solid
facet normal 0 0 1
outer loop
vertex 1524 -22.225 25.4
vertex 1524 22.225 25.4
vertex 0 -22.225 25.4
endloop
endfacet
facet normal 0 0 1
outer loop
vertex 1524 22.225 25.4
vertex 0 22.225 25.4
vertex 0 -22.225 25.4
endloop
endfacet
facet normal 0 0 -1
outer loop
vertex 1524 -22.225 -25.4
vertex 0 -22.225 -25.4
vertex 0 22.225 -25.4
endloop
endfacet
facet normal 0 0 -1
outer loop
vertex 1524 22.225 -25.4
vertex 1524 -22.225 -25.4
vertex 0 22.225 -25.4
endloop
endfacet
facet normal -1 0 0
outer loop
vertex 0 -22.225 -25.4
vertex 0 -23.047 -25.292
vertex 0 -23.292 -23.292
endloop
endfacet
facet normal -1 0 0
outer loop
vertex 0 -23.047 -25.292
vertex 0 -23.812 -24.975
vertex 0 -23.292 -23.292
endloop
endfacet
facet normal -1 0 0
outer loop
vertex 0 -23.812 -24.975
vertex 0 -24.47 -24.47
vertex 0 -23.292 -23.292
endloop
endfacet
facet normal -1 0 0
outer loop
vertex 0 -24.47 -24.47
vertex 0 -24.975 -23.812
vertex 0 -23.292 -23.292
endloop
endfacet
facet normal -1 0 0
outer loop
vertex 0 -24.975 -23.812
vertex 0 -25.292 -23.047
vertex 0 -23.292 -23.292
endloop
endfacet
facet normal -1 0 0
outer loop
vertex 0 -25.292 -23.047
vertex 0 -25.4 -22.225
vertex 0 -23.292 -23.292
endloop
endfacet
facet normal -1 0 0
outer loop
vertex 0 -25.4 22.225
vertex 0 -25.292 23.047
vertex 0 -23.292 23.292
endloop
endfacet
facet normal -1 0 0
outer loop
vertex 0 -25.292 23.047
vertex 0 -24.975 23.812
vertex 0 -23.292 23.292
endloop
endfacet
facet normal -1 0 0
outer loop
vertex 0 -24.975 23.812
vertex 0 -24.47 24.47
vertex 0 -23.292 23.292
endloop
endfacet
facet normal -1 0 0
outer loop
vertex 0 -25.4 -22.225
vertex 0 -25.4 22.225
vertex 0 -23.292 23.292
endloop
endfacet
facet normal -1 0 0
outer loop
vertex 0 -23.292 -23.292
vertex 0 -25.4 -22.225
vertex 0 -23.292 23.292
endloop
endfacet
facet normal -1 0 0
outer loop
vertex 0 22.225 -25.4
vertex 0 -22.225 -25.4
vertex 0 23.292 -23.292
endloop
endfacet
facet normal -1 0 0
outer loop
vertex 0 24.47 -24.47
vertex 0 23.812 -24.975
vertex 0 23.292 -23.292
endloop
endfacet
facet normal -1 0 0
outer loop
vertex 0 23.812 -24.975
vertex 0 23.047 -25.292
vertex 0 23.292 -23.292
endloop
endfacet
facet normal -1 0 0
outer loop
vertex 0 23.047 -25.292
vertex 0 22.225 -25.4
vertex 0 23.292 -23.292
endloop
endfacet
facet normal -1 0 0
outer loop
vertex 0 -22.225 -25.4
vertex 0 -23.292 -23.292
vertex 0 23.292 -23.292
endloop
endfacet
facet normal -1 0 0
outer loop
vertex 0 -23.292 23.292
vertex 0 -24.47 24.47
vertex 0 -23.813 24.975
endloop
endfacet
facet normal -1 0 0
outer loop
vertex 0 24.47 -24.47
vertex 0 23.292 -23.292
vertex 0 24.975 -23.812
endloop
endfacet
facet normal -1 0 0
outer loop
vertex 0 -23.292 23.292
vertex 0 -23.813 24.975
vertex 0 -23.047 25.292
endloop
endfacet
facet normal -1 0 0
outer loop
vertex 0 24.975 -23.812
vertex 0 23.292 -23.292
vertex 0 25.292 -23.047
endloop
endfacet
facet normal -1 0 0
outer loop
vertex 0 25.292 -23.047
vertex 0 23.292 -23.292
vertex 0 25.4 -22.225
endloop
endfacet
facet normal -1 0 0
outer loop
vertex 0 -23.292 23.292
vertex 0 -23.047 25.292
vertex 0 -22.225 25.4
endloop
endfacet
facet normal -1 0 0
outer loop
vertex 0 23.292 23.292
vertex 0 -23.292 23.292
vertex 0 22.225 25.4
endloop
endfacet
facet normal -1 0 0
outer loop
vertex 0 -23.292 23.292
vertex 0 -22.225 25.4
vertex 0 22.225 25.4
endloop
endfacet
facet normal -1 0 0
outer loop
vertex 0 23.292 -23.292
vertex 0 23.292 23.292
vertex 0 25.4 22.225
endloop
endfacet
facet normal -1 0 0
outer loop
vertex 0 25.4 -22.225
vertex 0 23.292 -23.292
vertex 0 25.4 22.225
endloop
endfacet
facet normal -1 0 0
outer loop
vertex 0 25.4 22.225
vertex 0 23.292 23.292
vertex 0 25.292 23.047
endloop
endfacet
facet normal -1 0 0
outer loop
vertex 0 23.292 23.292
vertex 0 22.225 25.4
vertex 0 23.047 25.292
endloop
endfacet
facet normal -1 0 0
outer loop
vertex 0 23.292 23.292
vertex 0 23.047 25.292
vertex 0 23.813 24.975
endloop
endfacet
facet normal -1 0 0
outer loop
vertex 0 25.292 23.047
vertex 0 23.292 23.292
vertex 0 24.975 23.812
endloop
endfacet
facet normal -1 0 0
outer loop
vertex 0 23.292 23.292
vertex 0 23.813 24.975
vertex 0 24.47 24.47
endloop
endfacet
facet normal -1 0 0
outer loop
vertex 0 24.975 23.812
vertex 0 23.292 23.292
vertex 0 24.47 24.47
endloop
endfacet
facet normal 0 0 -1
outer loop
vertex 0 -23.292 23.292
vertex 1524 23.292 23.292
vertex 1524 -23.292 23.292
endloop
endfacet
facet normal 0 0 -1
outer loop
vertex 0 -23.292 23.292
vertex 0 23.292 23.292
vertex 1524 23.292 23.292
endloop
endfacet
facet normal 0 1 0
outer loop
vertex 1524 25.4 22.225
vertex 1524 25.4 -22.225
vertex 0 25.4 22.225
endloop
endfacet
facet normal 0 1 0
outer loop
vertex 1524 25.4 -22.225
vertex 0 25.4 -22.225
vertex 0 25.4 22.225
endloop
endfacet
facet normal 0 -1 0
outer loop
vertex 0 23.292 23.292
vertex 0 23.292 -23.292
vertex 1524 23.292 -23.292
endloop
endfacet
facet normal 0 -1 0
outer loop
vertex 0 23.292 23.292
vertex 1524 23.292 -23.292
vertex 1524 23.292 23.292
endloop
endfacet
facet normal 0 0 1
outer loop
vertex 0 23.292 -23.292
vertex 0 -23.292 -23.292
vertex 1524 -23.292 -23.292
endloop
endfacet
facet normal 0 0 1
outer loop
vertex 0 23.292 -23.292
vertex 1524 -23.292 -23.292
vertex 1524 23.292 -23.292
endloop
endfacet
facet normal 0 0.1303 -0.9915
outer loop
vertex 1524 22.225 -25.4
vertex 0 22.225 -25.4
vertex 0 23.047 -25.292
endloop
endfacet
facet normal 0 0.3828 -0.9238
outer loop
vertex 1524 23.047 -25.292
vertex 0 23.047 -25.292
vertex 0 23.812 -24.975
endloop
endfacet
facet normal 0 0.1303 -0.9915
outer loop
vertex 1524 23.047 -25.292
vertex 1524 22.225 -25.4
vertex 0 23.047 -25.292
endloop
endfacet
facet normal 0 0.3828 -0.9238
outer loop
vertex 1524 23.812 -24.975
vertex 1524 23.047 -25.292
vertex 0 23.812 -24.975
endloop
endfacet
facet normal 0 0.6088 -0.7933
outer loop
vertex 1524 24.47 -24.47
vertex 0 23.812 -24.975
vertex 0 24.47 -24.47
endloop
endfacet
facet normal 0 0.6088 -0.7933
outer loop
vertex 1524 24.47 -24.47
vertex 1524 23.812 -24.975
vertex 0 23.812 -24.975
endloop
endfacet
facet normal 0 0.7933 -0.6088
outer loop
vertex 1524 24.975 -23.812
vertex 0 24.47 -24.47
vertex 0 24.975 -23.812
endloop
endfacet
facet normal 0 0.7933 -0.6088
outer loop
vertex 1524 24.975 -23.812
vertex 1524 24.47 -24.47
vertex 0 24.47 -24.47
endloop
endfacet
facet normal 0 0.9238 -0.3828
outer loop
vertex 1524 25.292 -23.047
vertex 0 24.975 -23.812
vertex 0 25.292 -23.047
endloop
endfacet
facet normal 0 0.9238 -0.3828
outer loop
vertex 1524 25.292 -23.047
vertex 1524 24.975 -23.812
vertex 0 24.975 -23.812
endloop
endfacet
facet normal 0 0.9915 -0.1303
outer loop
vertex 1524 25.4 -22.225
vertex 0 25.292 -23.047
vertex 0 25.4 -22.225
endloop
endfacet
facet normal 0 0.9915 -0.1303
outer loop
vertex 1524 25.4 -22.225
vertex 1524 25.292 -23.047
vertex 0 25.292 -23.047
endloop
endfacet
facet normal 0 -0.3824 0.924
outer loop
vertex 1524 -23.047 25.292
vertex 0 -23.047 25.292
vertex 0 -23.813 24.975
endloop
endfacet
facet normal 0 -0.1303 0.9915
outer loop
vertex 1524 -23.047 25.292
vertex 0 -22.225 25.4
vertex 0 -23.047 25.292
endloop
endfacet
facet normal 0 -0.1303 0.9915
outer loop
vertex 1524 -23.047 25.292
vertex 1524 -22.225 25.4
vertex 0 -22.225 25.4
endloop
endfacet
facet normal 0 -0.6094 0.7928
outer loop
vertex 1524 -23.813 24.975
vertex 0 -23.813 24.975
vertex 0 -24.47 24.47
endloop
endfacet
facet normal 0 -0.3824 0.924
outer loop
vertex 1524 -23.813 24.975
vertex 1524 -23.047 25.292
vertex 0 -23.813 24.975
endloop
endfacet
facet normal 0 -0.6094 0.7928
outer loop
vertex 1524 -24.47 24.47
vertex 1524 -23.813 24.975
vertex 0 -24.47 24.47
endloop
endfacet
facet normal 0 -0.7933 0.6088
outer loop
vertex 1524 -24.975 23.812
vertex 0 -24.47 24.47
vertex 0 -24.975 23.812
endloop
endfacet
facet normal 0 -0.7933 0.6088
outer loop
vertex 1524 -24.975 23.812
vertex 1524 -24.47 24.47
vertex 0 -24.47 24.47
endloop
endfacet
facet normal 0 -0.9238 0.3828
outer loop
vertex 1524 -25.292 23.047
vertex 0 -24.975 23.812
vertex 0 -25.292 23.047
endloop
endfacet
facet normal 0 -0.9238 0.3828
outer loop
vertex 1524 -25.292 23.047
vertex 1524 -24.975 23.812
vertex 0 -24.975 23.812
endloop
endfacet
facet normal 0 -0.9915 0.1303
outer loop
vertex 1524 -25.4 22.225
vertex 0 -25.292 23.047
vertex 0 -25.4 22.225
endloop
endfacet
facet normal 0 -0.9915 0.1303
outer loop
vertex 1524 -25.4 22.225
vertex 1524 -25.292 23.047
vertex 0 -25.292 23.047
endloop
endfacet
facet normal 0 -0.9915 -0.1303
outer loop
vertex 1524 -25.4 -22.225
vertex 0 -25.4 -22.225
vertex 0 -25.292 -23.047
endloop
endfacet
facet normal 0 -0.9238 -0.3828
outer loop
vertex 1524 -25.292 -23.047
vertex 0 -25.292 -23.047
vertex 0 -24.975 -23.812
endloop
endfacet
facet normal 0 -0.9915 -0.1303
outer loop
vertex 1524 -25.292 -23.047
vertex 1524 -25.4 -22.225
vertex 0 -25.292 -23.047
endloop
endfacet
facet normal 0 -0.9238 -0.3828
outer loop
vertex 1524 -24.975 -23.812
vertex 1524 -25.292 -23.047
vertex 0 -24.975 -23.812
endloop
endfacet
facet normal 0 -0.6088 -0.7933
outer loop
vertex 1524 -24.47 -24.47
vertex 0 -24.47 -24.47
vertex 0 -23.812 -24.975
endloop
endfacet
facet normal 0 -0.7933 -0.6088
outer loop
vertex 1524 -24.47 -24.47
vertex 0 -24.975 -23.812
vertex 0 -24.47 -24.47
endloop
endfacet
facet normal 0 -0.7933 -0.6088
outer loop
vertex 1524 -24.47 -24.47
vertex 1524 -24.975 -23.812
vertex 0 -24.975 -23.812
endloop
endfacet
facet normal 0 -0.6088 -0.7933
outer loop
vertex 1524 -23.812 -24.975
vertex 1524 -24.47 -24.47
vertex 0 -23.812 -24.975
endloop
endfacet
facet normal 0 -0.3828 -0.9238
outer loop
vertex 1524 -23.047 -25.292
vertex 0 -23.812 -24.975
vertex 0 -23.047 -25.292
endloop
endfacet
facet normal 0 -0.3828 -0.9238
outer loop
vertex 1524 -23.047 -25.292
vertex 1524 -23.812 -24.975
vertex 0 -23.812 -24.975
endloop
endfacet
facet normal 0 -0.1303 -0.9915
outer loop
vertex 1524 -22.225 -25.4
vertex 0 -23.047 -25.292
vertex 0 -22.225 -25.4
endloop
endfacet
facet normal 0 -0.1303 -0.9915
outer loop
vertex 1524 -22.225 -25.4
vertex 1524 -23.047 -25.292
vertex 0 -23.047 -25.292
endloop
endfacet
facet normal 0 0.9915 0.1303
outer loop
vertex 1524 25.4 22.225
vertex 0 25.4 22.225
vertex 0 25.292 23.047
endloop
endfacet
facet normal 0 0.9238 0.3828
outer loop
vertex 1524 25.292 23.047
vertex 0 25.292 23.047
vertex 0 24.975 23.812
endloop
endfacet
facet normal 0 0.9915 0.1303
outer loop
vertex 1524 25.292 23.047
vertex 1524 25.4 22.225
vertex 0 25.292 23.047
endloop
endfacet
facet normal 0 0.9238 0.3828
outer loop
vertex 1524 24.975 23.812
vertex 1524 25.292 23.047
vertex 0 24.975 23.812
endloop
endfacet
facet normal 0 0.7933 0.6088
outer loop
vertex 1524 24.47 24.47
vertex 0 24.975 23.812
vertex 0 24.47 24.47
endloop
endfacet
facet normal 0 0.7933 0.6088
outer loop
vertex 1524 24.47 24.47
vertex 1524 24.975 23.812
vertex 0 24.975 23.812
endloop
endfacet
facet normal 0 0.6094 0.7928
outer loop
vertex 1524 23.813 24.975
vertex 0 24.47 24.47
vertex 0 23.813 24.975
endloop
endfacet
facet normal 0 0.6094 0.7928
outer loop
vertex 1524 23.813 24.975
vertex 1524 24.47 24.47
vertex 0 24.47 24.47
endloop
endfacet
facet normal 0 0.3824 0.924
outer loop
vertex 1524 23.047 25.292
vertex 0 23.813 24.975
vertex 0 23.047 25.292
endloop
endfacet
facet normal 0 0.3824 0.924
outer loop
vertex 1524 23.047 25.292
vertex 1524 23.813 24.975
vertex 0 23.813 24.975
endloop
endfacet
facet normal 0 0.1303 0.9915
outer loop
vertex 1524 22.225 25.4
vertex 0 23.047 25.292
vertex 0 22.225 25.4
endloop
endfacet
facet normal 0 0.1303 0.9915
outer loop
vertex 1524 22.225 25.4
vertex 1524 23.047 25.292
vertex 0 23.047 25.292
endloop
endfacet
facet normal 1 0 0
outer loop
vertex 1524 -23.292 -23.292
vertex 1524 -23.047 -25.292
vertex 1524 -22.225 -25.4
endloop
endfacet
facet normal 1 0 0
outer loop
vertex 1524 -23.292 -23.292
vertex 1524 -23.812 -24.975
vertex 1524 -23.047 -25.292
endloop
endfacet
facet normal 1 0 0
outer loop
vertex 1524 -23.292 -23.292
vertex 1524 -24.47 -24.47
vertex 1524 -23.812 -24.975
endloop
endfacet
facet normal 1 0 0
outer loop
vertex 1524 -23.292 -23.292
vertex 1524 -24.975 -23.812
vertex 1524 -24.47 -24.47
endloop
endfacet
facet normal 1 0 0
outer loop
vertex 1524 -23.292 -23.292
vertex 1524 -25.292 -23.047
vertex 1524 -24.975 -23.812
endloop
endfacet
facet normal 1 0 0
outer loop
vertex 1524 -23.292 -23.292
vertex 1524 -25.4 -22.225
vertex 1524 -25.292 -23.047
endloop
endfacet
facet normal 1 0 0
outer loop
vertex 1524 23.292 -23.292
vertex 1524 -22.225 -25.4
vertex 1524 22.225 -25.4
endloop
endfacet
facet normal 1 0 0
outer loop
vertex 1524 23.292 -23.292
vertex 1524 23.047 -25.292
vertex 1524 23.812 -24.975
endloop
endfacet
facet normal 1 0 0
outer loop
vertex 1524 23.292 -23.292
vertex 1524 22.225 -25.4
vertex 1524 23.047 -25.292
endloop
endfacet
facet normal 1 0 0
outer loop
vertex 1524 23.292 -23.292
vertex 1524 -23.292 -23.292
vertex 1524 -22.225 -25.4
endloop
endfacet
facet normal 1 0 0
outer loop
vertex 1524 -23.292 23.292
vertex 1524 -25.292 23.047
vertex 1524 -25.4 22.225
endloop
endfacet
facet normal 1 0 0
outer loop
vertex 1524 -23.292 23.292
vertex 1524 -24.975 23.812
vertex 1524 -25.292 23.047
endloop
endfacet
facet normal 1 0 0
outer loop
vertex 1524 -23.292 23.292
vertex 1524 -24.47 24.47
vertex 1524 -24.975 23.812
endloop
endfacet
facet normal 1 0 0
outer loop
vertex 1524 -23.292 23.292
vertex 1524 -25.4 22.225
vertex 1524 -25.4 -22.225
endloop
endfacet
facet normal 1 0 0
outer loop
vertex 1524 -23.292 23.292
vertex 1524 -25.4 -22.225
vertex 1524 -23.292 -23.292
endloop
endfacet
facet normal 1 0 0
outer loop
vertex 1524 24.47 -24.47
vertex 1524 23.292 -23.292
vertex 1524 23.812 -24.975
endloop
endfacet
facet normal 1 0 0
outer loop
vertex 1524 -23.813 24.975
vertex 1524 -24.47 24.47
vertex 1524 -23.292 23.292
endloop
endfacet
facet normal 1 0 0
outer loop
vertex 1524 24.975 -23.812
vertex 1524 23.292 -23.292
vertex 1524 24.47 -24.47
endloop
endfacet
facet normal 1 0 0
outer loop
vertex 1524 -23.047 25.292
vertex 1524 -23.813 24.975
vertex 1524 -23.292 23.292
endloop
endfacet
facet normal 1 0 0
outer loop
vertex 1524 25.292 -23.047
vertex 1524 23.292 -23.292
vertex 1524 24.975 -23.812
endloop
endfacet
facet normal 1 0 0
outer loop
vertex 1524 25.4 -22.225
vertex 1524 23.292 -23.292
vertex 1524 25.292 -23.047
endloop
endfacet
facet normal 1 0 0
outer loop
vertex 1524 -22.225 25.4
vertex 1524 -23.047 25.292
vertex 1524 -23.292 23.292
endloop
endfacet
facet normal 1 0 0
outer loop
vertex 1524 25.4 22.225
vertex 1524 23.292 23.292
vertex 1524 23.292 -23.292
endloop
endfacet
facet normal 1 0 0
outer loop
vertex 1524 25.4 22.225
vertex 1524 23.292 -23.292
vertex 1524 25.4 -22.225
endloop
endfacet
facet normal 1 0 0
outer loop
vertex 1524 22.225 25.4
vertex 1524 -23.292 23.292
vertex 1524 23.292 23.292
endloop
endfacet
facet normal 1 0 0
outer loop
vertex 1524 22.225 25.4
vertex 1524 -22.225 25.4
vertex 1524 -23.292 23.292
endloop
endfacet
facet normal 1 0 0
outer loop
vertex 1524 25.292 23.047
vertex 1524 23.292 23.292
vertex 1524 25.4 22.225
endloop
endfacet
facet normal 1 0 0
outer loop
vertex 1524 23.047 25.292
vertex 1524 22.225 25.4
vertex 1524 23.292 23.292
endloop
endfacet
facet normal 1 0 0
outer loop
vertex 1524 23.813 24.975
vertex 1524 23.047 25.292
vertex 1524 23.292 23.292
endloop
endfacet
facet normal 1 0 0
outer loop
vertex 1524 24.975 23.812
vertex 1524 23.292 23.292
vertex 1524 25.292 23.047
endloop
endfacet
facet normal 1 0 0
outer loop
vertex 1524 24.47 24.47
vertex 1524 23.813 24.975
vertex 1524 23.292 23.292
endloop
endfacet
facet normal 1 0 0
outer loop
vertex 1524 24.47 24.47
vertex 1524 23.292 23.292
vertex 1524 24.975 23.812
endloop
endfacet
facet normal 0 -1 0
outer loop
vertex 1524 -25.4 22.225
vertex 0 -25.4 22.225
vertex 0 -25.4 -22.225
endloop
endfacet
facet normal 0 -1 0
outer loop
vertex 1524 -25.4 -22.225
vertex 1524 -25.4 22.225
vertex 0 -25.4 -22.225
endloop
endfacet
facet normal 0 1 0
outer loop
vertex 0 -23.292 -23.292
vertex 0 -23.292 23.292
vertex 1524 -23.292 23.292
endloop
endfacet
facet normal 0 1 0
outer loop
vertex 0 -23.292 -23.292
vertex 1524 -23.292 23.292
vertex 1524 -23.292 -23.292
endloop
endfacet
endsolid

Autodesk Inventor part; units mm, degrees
ref_plane "YZ Plane" through (0, 0, 0) normal (1, 0, 0) x (0, 1, 0)
ref_plane "XZ Plane" through (0, 0, 0) normal (0, 1, 0) x (-1, 0, 0)
ref_plane "XY Plane" through (0, 0, 0) normal (0, 0, 1) x (1, 0, 0)
sketch "Sketch1" plane through (0, 0, 0) normal (1, 0, 0) x (0, 1, 0)
  line L0 (25.4, 25.4) -> (-25.4, 25.4)
  line L1 (-25.4, 25.4) -> (-25.4, -25.4)
  line L2 (-25.4, -25.4) -> (25.4, -25.4)
  line L3 (25.4, -25.4) -> (25.4, 25.4)
  line L4 (23.2918, 23.2918) -> (-23.2918, 23.2918)
  line L5 (-23.2918, 23.2918) -> (-23.2918, -23.2918)
  line L6 (-23.2918, -23.2918) -> (23.2918, -23.2918)
  line L7 (23.2918, -23.2918) -> (23.2918, 23.2918)
  point P0 (0, 0)
  point P1 (0, -25.4)
  point P2 (25.4, 0)
  dimension "d0" = 50.8
  dimension "d1" = 50.8
  dimension "d2" = 2.1082
extrude "Extrusion1" add sketch "Sketch1" along normal blind 1524
fillet "Fillet1" radius 3.175 4 edges at (762, 25.4, 25.4) (762, -25.4, 25.4) (762, 25.4, -25.4) (762, -25.4, -25.4)
properties part number "60_inch_square" material "Steel"
